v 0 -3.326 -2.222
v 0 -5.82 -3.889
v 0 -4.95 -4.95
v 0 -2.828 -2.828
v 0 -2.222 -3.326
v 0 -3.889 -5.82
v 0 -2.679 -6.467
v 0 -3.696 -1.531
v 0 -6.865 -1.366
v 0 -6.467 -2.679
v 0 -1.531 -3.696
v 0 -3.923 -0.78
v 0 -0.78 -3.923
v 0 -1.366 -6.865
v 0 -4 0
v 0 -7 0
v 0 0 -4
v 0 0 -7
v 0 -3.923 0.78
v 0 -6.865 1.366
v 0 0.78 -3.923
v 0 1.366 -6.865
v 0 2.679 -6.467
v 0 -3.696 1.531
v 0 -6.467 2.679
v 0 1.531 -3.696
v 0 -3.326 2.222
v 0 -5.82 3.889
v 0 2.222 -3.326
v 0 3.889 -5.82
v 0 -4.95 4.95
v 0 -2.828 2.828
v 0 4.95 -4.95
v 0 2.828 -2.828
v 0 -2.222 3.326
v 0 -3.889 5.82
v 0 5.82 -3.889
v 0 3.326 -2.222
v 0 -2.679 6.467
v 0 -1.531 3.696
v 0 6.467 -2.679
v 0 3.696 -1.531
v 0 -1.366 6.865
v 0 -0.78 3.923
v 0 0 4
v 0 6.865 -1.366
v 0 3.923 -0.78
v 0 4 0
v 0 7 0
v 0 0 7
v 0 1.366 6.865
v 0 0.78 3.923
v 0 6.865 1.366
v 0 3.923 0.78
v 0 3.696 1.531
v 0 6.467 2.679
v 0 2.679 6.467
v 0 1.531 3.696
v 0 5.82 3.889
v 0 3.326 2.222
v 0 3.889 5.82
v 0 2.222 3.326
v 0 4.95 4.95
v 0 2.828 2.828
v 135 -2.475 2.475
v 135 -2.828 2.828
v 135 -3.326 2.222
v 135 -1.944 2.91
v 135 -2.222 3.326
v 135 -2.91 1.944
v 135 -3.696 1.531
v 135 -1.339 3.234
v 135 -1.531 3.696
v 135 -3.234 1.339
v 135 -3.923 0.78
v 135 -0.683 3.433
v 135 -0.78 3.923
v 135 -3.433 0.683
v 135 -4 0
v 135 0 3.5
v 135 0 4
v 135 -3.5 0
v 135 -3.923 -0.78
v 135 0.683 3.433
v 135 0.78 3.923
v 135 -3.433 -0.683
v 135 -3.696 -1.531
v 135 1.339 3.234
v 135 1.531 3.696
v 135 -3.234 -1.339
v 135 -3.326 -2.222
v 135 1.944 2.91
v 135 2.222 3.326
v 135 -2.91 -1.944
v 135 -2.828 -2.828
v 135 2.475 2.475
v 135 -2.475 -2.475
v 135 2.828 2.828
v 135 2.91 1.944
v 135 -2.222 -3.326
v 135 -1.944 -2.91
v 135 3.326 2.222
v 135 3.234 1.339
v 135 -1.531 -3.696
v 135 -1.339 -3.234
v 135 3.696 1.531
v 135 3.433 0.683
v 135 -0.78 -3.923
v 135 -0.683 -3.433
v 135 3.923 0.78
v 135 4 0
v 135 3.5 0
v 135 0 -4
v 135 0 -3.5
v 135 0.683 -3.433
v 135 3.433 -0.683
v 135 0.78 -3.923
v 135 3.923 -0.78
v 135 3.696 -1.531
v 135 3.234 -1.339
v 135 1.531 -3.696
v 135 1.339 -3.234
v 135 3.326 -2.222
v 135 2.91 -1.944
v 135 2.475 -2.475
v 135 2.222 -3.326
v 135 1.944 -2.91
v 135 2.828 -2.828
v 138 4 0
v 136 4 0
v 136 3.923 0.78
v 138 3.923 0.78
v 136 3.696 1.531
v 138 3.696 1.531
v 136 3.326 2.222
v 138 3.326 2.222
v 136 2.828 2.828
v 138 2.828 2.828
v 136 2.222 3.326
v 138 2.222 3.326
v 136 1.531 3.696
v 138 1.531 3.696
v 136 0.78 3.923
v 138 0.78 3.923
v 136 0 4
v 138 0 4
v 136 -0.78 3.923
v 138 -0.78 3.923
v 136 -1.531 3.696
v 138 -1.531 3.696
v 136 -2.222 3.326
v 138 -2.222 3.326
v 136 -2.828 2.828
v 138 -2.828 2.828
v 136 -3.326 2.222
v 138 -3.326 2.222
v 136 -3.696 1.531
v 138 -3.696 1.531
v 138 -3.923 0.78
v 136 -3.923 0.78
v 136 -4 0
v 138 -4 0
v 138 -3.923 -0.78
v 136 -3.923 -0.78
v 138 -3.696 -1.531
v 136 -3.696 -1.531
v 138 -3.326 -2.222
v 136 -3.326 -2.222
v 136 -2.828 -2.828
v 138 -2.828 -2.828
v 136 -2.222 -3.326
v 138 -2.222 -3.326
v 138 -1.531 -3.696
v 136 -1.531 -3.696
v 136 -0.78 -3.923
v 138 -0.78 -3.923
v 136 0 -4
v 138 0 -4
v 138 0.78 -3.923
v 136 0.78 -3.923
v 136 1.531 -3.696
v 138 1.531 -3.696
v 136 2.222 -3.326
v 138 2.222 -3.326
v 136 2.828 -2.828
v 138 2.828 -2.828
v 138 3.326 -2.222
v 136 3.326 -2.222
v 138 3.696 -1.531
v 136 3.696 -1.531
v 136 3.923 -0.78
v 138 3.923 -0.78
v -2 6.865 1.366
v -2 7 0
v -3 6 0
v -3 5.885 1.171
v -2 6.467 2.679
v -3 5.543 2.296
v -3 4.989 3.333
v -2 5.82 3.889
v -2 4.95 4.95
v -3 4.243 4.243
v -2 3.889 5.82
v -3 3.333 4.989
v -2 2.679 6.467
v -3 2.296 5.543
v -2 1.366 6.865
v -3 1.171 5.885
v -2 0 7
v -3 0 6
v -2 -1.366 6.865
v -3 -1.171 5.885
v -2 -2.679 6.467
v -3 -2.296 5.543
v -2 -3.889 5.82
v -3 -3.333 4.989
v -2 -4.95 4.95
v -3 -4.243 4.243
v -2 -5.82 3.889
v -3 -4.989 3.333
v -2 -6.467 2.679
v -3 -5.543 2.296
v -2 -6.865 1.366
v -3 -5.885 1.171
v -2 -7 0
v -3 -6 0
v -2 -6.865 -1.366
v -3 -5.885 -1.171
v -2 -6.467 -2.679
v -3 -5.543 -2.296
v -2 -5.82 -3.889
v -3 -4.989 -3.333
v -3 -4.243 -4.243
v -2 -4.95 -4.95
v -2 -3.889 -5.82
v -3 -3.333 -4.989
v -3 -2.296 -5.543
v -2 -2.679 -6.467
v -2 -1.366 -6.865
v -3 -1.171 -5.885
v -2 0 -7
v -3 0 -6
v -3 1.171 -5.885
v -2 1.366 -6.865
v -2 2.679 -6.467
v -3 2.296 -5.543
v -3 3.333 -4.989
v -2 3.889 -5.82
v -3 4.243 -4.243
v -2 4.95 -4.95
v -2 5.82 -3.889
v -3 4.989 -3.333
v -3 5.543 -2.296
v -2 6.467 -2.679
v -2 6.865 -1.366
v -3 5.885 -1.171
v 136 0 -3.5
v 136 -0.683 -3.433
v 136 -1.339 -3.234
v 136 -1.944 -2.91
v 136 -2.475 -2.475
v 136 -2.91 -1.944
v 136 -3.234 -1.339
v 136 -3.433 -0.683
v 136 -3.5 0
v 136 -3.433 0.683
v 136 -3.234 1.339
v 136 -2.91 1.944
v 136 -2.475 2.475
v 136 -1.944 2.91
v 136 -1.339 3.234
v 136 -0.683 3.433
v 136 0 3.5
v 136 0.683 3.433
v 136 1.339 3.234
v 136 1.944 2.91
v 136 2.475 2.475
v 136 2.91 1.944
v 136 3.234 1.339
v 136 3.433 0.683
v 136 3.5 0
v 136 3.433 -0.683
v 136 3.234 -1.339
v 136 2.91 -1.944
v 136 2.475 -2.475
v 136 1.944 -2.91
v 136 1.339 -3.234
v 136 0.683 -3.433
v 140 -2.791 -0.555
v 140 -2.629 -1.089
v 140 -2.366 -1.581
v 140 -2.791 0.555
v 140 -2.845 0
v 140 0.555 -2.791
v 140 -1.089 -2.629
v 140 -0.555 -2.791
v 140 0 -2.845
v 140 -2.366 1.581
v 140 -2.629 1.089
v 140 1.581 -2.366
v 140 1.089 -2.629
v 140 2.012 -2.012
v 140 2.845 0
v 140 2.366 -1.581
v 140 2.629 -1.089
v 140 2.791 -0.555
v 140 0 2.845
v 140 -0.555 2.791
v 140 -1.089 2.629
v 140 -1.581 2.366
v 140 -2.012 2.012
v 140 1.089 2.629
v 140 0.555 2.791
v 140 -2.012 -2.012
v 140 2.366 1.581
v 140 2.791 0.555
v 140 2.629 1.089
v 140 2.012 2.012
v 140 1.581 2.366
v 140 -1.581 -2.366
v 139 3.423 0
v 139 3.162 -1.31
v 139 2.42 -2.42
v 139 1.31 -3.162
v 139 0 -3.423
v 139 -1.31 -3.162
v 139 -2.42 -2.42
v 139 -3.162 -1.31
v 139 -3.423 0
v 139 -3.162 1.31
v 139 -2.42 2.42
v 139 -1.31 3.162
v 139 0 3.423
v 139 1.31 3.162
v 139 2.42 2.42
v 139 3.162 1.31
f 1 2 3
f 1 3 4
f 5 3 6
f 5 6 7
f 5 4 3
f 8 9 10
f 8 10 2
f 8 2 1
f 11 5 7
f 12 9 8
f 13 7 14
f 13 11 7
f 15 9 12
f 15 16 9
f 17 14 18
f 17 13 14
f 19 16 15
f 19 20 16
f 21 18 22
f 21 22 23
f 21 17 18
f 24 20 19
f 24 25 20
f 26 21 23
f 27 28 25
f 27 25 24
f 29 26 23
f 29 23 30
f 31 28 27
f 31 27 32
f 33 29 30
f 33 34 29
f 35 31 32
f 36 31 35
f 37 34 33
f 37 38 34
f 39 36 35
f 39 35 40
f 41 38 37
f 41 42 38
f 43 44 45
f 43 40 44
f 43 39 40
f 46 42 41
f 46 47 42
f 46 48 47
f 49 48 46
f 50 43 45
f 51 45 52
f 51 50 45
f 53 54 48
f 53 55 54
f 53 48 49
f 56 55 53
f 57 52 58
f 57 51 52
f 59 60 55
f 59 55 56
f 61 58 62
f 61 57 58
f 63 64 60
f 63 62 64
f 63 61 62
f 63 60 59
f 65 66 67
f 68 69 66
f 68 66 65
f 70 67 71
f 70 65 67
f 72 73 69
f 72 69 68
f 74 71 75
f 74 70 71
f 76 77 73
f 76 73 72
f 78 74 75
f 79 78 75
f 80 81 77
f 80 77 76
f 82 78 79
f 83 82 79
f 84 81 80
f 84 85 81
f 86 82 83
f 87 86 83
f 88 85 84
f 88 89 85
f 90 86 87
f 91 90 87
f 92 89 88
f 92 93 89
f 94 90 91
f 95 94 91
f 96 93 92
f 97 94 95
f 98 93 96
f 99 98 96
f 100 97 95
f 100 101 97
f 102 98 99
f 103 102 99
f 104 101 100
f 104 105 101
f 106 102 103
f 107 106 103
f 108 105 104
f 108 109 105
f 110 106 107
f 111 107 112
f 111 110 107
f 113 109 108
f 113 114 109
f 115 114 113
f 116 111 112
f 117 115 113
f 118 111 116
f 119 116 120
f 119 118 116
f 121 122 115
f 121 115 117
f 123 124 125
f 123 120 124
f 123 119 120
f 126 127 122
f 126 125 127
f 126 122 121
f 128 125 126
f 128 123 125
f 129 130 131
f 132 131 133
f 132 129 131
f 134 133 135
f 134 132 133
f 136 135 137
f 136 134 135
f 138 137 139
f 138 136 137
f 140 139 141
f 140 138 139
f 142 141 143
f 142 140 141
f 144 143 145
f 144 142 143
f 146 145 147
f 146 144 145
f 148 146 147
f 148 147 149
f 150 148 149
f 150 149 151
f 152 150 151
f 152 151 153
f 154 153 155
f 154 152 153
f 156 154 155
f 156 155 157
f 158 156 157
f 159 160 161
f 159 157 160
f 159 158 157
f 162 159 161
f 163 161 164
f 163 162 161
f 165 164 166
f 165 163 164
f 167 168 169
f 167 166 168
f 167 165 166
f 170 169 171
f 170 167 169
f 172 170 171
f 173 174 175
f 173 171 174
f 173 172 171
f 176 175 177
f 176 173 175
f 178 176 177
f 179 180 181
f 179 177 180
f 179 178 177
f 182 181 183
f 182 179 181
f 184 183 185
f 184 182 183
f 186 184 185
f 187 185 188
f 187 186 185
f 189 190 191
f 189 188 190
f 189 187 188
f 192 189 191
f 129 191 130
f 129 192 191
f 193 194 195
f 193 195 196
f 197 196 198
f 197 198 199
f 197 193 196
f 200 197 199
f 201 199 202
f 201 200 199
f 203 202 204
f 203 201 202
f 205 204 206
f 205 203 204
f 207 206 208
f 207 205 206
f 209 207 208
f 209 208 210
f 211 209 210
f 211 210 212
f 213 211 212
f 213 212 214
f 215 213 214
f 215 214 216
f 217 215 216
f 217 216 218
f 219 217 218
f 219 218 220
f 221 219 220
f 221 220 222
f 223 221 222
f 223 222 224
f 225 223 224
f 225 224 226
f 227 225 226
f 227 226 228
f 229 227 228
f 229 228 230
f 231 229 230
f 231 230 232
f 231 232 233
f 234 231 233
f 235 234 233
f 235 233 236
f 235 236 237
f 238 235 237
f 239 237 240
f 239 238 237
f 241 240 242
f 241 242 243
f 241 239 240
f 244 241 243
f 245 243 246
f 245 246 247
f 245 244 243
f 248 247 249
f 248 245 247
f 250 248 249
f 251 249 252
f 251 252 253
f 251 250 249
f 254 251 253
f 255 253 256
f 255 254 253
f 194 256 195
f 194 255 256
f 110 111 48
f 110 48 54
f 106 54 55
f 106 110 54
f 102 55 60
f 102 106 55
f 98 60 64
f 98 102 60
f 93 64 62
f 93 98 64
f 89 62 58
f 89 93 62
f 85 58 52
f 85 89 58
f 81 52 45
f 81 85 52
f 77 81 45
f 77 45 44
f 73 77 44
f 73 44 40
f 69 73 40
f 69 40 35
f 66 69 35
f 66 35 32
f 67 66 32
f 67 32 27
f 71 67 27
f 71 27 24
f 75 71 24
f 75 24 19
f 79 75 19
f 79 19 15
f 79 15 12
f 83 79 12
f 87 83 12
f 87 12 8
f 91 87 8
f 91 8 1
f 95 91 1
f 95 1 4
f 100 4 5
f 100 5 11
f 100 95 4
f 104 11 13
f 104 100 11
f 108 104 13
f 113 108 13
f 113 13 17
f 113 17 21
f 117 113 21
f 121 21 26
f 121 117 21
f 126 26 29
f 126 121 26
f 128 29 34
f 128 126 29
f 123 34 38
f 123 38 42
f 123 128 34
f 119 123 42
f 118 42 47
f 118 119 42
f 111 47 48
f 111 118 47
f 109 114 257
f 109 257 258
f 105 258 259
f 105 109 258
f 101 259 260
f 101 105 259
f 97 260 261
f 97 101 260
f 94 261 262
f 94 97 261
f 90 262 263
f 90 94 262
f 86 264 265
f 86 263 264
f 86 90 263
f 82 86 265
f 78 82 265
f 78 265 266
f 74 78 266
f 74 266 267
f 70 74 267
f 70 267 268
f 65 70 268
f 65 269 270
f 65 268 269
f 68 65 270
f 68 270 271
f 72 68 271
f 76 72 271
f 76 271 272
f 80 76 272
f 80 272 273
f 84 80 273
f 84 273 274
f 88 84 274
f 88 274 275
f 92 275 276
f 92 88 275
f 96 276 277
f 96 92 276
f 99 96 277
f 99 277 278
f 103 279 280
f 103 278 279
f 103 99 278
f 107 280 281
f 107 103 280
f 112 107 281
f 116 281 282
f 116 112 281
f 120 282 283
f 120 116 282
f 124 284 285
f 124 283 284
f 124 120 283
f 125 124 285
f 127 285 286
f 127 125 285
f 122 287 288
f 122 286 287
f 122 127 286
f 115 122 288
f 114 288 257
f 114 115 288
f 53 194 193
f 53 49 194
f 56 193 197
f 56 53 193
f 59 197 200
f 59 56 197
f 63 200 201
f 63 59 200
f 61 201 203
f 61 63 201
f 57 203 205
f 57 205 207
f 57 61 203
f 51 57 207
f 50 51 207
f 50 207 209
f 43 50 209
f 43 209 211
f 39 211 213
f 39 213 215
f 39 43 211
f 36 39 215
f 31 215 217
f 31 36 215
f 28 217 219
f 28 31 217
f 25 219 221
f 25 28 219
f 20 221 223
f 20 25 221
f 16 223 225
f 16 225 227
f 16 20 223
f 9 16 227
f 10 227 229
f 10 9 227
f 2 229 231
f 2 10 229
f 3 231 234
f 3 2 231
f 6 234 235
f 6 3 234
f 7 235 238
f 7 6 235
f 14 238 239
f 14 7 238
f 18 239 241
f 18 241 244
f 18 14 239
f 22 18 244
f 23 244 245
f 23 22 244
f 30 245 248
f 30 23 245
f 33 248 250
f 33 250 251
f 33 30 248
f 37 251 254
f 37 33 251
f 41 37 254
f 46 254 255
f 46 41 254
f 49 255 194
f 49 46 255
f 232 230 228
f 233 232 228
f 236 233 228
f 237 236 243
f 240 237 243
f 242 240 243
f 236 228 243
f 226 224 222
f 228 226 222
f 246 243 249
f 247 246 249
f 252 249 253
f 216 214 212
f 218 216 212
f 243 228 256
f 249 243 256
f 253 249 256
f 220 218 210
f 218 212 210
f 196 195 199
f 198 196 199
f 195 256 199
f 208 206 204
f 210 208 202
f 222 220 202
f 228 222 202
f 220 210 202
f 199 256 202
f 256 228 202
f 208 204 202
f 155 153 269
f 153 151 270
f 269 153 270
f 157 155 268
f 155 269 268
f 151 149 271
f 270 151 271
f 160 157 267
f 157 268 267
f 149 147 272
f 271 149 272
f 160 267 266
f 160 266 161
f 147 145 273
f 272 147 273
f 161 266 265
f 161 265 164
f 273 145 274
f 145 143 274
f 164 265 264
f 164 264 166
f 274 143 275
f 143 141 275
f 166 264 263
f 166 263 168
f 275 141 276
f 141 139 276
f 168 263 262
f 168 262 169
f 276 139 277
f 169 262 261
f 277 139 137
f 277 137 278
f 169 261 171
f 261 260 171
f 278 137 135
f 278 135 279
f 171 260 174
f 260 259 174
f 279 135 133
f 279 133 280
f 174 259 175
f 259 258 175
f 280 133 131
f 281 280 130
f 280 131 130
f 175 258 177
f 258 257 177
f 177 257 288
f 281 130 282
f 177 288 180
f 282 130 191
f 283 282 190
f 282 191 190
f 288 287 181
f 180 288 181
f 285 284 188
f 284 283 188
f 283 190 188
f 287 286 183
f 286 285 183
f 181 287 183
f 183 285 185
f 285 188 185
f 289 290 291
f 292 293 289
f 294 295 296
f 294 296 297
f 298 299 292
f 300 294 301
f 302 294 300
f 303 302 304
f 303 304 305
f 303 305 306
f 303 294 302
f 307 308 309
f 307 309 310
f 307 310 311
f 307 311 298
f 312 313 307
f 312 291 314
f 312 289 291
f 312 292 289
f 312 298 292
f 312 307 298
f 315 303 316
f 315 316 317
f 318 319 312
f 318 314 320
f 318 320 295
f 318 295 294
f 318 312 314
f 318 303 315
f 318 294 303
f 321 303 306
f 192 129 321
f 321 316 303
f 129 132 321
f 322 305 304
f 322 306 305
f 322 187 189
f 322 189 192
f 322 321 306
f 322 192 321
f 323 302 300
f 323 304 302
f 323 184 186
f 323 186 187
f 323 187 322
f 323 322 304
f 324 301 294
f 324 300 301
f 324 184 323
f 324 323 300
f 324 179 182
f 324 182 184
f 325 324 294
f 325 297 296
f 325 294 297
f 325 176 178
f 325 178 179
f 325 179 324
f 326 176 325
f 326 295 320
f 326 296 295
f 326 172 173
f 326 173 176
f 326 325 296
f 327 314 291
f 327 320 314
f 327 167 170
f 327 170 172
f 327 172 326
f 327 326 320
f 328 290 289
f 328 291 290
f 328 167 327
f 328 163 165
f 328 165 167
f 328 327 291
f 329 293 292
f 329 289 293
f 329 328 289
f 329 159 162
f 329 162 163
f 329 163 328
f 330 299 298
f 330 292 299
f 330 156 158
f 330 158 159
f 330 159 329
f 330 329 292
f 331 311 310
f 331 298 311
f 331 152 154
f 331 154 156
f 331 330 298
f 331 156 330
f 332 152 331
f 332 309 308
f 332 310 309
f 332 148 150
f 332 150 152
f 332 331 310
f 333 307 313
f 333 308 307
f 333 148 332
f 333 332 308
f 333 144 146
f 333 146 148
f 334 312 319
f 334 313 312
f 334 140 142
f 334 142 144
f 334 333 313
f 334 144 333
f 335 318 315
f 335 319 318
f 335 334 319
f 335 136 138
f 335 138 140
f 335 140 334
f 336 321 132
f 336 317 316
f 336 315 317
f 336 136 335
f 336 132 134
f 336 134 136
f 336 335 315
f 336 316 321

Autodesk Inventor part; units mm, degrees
ref_plane "YZ Plane" through (0, 0, 0) normal (1, 0, 0) x (0, 1, 0)
ref_plane "XZ Plane" through (0, 0, 0) normal (0, 1, 0) x (-1, 0, 0)
ref_plane "XY Plane" through (0, 0, 0) normal (0, 0, 1) x (1, 0, 0)
sketch "Szkic1" plane through (0, 0, 0) normal (0, 0, 1) x (1, 0, 0)
  line L0 (-3, 0) -> (-3, 7)
  line L1 (-3, 7) -> (0, 7)
  line L2 (0, 7) -> (0, 4)
  line L3 (0, 4) -> (140, 4)
  line L4 (140, 4) -> (140, 0)
  line L5 (-3, 0) -> (140, 0)
  line L6 (-31.6, 0) -> (168.6, 0) projected
  line L7 (0, -1.4) -> (0, 8.4) projected
  dimension "d0" = 3
  dimension "d1" = 140
  dimension "d2" = 8
  dimension "d3" = 14
revolve "Bryła" add sketch "Szkic1" angle 360 about axis through (-3, 0, 0) along (1, 0, 0)
chamfer "Faza1" distance 2 angle 30 1 edges at (140, -4, 0) measured on face at (46.6667, 3.987, -0.3219)
chamfer "Faza2" distance 1 angle 45 1 edges at (-3, -7, 0) measured on face at (-2, 6.9773, -0.5633)
ref_plane "Płaszczyzna konstrukcyjna1" through (135, 0, 0) normal (1, 0, 0) x (0, 0, -1)
sketch "Szkic2" plane through (135, 0, 0) normal (1, 0, 0) x (0, 0, -1)
  circle A0 centre (0, 0) radius 2.8453 projected
  circle A1 centre (0, 0) radius 4
  circle A2 centre (0, 0) radius 4 projected
  circle A3 centre (0, 0) radius 3.5
  point P0 (0, 0)
  dimension "d16" = 7
extrude "Wyciągnięcie proste1" cut sketch "Szkic2" along normal blind 1 contours A1
equation "\"d0\" = KOH"
equation "\"d2\" = NND"
equation "\"d3\" = KOD"
equation "\"d7\" = PHH1"
equation "\"d8\" = FAWI1"
equation "\"d12\" = PHH1"
equation "\"d4\" = PHH2"
equation "\"d6\" = FAWI2"
equation "\"d13\" = PHH2"
equation "\"KOH\" = 3"
equation "\"KOD\" = 14"
equation "\"NND\" = 8"
equation "\"FAWI1\" = 30deg"
equation "\"FAWI2\" = 45deg"
equation "\"PHH2\" = 1"
equation "\"PHH1\" = 2"
properties part number "ISO 2341 - A - 8 x 70" material "Stal"
